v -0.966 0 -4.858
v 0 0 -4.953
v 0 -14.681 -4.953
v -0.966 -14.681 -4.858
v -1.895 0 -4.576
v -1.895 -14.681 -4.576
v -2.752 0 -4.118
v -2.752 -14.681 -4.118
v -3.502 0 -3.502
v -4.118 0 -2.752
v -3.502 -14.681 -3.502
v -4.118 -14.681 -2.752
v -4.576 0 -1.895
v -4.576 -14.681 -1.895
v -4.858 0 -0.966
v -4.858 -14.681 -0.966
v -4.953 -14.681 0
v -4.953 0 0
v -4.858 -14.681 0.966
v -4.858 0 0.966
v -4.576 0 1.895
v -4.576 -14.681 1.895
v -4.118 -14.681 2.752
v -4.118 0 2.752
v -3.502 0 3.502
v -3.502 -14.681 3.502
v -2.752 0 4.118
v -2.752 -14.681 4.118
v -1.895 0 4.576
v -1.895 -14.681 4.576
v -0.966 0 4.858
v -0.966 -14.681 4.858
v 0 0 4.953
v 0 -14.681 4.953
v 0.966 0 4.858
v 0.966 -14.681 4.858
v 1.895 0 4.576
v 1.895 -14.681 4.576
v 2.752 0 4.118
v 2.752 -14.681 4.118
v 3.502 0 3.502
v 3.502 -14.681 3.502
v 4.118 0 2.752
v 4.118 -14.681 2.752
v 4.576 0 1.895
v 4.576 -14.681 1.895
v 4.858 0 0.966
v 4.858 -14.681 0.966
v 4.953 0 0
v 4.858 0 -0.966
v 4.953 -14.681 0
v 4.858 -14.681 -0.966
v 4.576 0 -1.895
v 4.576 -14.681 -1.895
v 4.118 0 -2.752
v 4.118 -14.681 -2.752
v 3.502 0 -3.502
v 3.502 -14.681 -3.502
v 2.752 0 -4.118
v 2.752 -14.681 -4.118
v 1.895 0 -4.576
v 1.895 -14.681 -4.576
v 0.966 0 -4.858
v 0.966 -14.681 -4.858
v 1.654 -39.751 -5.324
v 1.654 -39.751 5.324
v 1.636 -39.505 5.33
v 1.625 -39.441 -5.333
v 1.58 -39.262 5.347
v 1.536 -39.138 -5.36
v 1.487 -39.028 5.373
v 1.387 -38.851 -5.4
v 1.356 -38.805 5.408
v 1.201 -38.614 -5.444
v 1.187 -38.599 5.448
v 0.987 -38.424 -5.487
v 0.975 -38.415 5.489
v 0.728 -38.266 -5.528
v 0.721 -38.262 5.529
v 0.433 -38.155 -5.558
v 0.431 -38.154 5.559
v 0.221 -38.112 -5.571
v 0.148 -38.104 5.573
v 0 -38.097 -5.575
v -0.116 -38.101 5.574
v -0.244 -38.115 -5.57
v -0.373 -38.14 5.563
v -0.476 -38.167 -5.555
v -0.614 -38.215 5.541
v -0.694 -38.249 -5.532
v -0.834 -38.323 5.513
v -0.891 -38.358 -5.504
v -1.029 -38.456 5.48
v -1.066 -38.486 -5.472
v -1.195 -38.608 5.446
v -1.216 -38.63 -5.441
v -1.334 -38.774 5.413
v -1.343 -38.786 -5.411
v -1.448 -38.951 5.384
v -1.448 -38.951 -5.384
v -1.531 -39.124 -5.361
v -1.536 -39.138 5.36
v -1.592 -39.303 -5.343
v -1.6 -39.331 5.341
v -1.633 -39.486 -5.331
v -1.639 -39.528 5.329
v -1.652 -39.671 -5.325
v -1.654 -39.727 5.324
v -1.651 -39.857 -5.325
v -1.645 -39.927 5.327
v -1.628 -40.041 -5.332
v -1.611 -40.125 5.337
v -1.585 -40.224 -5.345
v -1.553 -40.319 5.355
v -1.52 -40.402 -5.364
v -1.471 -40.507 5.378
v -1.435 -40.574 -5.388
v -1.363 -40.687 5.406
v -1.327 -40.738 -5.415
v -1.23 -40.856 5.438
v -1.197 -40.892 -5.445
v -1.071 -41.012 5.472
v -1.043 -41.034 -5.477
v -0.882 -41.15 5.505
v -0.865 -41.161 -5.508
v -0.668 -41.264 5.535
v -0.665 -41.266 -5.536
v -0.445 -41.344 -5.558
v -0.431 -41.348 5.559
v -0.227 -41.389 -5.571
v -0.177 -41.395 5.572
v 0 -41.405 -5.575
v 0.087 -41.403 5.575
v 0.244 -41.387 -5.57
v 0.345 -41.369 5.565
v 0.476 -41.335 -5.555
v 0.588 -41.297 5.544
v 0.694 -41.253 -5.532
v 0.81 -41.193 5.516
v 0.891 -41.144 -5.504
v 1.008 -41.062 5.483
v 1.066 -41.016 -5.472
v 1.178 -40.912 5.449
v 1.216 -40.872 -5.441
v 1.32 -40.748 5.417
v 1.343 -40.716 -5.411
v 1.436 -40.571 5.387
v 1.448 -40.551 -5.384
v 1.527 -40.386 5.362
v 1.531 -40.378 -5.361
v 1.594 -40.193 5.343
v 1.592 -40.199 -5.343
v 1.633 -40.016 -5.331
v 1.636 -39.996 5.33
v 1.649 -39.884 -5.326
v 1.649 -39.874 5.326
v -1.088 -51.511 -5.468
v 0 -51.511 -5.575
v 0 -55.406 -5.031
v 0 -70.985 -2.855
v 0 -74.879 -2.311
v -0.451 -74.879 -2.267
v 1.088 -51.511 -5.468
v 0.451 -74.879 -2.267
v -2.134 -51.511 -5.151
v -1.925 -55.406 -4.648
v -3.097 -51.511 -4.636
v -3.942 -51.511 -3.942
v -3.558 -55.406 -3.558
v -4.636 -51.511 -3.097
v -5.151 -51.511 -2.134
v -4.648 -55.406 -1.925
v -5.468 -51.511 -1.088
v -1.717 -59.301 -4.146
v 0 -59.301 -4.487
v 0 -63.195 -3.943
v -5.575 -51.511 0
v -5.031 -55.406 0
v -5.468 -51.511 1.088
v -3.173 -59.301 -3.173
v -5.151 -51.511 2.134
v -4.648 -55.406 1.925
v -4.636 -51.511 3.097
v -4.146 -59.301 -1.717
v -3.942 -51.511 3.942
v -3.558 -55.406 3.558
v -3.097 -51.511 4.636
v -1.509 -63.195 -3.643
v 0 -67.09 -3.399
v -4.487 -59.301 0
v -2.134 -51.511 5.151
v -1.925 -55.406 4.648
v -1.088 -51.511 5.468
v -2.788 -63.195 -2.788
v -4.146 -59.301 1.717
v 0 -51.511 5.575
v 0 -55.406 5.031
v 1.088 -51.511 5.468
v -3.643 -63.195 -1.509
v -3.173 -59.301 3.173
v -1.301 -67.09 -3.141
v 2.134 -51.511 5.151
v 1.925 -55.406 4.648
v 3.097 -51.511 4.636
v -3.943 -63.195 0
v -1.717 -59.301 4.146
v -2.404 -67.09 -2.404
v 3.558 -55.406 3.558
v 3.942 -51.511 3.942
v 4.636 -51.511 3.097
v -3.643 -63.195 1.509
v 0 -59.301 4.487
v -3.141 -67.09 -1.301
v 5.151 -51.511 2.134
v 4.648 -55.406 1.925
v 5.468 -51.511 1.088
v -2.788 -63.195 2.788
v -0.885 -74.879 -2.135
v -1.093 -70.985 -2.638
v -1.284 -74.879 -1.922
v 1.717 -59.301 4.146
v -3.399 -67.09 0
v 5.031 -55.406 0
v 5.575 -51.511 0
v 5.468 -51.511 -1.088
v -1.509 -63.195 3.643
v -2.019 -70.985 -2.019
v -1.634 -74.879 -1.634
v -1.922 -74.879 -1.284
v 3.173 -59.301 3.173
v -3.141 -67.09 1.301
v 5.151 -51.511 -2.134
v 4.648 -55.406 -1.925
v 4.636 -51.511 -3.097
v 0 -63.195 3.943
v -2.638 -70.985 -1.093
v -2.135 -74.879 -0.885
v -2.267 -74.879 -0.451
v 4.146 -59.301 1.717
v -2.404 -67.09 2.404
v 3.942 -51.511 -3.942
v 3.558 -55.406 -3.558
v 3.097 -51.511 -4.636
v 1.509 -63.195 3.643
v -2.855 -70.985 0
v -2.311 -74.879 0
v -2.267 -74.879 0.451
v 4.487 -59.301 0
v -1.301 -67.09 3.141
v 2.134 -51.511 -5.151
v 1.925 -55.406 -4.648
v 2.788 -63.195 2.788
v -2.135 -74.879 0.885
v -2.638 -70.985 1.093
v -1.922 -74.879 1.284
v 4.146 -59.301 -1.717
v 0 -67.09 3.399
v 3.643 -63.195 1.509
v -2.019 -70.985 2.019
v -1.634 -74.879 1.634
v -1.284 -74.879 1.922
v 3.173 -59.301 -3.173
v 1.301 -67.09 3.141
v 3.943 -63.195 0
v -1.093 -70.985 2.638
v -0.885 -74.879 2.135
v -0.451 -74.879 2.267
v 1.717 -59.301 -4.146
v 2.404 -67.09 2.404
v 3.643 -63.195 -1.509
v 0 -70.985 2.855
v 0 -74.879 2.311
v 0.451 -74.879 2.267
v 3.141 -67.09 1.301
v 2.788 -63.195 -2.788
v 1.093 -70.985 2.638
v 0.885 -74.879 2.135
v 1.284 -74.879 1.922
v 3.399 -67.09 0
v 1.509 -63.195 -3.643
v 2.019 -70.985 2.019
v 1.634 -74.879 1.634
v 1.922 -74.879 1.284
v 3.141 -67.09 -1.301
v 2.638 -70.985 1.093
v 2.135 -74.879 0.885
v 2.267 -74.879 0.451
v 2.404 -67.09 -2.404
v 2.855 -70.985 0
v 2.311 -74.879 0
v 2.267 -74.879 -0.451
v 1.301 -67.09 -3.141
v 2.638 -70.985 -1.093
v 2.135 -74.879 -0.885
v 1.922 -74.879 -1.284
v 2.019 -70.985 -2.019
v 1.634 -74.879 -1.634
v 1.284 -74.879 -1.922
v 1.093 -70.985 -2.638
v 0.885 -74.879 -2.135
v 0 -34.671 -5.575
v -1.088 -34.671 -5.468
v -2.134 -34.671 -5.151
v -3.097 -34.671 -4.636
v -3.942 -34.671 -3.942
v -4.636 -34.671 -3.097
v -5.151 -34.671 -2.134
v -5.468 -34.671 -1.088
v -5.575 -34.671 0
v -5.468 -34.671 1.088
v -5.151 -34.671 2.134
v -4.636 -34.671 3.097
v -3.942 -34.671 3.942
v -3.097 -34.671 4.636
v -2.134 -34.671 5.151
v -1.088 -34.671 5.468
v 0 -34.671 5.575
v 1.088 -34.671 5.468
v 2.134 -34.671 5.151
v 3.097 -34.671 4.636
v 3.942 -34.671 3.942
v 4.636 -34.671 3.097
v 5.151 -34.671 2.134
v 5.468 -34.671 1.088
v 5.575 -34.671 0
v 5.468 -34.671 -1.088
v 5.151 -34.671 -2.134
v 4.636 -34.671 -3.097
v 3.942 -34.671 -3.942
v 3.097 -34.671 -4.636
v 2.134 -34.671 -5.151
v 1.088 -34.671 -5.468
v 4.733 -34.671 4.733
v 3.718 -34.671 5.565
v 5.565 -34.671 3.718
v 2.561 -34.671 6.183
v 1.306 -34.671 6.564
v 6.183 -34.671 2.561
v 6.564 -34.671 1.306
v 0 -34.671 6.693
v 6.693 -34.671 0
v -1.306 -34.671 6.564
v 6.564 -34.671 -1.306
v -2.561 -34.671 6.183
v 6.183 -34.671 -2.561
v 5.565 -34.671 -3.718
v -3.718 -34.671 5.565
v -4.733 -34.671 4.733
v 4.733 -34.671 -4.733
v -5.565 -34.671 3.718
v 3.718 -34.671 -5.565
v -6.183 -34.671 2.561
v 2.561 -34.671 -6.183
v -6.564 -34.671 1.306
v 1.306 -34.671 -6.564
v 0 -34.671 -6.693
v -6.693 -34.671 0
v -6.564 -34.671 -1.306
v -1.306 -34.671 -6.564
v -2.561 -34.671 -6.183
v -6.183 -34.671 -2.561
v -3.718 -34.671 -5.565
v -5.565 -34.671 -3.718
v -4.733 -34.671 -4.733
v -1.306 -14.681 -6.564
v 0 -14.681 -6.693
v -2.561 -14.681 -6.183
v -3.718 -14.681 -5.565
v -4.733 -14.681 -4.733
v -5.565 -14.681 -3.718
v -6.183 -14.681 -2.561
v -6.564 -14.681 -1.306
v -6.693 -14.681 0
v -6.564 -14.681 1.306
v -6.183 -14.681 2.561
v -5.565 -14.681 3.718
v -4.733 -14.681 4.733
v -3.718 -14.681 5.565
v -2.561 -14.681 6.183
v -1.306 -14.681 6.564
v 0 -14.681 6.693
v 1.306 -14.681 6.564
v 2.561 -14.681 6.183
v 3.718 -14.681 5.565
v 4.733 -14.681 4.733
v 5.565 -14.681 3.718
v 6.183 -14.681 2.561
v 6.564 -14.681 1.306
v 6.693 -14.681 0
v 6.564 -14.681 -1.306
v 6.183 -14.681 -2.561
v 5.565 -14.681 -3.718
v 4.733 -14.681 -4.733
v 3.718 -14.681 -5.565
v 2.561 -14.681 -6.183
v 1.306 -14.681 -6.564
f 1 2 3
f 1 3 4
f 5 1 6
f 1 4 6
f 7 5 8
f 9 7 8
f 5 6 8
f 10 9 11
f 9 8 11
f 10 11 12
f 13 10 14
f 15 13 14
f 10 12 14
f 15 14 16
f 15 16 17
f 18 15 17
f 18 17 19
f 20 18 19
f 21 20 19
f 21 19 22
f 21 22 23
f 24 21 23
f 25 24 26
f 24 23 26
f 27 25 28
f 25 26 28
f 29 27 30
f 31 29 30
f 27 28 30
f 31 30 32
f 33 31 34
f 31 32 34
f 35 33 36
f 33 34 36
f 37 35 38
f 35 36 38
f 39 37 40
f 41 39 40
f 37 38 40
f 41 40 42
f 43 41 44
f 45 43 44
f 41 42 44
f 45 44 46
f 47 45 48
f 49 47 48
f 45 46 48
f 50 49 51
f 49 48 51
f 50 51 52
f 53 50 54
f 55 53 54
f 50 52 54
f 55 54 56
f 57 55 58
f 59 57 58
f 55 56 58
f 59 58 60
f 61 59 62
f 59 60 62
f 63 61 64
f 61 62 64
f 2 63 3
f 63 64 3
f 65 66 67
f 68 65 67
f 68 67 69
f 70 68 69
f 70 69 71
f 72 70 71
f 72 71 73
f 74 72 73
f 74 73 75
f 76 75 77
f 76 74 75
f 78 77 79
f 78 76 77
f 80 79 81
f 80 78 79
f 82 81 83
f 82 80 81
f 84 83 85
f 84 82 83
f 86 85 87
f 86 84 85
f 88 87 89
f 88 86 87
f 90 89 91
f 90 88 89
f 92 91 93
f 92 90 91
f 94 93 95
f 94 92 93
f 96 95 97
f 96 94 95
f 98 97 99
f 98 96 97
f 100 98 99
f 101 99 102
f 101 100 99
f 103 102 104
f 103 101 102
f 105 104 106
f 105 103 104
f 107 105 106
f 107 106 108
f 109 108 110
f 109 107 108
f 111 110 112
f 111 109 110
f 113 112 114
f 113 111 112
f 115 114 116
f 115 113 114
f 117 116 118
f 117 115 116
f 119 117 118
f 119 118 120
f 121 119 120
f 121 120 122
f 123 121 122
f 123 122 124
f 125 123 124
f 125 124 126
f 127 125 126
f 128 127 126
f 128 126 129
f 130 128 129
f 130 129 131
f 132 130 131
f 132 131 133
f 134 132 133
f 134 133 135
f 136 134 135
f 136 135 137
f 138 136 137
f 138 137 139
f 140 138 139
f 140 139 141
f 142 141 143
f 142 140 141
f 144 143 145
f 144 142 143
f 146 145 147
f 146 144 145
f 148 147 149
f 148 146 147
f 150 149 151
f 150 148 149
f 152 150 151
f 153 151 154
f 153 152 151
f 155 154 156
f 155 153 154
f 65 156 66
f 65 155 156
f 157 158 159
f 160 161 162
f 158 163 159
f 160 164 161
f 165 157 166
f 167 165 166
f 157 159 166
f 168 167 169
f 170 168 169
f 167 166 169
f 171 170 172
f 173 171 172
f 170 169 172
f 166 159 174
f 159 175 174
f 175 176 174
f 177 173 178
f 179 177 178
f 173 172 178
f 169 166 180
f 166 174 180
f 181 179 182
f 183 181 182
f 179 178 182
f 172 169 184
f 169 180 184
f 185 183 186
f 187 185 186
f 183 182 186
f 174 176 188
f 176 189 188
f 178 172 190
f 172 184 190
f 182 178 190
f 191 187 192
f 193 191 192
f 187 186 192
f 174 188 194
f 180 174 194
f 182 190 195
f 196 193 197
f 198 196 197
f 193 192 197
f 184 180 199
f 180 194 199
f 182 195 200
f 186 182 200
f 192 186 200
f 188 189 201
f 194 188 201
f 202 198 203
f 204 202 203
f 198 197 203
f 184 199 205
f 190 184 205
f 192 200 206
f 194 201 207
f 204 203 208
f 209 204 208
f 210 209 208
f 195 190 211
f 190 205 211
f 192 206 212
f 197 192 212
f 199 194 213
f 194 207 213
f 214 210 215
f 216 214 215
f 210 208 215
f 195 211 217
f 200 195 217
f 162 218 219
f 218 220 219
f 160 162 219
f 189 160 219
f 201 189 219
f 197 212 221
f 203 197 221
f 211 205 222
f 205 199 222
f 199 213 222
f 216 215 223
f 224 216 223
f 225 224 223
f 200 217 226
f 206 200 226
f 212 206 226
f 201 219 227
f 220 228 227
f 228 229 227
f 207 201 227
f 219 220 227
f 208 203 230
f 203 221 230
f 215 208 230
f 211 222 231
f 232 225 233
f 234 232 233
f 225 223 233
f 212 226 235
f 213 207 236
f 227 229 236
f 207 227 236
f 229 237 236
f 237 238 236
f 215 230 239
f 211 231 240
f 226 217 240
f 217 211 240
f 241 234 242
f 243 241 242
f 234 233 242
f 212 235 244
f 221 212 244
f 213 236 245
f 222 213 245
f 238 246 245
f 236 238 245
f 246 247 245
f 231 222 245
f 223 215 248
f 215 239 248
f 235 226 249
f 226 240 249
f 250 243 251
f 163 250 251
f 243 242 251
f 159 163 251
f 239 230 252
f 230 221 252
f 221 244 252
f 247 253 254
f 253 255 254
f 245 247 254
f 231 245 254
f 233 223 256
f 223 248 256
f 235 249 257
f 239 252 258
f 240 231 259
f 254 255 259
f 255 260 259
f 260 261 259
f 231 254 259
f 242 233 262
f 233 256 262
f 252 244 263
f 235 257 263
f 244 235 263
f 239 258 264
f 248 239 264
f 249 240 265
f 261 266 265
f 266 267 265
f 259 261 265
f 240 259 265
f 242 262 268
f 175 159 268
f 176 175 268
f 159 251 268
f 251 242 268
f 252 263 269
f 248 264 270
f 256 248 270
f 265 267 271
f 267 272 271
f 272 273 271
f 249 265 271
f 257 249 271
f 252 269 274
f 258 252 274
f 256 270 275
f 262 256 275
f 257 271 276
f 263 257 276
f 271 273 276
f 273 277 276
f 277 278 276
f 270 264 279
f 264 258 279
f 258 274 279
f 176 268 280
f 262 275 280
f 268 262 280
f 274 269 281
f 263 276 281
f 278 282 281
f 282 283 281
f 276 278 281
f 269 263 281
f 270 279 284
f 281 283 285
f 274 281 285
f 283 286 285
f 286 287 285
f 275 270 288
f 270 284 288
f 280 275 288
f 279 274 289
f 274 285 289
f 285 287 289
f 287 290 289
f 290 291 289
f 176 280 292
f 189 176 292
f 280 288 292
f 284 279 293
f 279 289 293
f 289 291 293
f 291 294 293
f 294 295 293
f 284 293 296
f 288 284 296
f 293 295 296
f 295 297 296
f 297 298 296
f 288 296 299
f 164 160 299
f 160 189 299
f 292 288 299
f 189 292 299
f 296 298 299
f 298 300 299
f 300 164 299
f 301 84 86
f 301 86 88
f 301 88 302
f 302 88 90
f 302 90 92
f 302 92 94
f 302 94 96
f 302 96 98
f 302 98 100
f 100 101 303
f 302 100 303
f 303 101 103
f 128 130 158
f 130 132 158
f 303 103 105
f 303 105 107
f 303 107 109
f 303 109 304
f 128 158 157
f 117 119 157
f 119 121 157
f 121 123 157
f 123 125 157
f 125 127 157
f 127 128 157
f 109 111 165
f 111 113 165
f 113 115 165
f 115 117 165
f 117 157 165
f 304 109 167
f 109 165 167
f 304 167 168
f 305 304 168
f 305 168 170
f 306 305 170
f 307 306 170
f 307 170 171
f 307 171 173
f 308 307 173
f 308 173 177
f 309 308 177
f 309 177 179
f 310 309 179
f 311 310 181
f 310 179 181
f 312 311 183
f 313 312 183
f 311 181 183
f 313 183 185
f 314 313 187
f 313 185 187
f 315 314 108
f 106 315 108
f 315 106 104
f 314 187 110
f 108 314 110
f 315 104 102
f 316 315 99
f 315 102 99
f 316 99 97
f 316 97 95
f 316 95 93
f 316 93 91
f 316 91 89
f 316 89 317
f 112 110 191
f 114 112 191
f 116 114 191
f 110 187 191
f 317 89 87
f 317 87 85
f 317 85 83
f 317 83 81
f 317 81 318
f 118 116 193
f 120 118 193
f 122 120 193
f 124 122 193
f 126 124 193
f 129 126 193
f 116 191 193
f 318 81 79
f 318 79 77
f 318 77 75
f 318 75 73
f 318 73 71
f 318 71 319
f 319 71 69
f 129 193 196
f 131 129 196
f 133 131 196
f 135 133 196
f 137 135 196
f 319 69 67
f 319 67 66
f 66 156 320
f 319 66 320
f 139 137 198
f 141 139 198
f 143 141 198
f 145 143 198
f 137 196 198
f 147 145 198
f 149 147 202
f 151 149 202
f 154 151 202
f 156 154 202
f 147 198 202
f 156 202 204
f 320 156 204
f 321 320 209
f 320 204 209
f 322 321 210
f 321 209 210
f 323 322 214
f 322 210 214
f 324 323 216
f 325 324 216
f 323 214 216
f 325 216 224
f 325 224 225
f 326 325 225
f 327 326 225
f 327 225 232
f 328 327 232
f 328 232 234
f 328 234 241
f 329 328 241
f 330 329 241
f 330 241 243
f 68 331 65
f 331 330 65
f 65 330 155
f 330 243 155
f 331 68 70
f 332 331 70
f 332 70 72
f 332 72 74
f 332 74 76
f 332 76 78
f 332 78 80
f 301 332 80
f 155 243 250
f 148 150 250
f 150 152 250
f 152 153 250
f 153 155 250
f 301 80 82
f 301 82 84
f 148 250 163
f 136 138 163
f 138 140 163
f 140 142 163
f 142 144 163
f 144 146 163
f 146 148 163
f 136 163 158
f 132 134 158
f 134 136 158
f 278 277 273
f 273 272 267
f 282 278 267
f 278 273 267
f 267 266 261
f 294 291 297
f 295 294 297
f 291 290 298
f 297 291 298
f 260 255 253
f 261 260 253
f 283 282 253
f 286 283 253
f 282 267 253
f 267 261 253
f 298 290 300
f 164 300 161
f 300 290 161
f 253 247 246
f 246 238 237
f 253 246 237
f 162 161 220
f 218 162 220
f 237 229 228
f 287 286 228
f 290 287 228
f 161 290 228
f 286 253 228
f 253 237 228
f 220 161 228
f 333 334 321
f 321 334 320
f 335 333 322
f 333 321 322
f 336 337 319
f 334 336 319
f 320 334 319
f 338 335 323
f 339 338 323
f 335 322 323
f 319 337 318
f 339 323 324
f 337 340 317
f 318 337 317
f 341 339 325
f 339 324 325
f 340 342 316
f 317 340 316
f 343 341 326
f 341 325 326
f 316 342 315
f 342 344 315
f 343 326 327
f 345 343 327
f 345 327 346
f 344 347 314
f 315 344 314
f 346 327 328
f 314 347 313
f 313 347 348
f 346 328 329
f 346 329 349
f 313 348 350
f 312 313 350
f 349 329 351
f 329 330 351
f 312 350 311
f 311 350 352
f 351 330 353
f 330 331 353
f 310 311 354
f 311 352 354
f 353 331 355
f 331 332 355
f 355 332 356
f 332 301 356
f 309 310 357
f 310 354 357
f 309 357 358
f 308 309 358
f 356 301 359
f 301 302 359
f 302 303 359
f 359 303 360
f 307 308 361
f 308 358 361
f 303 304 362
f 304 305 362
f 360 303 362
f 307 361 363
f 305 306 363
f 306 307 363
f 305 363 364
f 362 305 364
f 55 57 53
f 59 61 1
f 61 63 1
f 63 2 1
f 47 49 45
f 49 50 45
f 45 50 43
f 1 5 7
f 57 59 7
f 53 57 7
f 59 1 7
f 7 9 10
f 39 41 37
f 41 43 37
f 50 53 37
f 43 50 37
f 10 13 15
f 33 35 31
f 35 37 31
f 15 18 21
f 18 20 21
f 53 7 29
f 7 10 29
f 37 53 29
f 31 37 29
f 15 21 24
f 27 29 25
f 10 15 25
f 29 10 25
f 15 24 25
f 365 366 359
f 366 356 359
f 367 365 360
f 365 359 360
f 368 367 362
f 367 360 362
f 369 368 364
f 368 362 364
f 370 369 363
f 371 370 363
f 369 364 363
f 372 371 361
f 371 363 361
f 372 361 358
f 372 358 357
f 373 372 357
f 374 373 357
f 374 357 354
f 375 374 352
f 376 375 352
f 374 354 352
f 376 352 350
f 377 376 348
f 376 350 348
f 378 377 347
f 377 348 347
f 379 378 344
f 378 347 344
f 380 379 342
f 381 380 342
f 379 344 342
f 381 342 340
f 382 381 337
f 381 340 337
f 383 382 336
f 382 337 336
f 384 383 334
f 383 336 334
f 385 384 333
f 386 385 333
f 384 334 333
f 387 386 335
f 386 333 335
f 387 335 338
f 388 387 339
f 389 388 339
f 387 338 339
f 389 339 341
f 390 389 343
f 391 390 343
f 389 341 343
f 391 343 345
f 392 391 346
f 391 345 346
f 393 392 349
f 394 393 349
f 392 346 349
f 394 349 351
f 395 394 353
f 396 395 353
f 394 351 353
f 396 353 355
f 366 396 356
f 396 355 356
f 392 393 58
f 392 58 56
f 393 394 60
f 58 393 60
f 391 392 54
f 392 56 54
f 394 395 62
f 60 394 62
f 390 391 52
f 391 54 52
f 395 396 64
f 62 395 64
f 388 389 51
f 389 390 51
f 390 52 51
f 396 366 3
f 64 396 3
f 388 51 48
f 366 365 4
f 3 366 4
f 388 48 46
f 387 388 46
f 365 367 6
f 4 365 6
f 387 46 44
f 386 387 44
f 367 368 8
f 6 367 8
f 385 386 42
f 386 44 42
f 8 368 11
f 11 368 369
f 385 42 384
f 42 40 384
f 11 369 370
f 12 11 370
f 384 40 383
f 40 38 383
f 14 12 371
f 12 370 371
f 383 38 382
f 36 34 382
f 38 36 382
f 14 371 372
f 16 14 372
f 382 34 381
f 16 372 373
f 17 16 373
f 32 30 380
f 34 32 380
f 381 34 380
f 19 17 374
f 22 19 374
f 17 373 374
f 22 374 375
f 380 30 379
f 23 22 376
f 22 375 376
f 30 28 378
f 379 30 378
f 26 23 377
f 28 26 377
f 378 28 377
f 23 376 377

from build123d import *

# Parameters (mm, degrees)
CUT_EXTRUDE1_DEPTH      = 76.475058221
CUT_EXTRUDE1_DEPTH_BACK = 76.475058221
SKETCH2_R               = 1.653940434


with BuildPart() as part:
    # Sketch1 → Revolve1 (revolve)
    with BuildSketch(Plane.XY, mode=Mode.PRIVATE) as revolve1_sk:
        Polygon((0, 0), (4.953, 0), (4.953, -14.6812), (6.6929, -14.6812), (6.6929, -34.671), (5.5753, -34.671), (5.5753, -51.5112), (2.3114, -74.8792), (0, -74.8792), align=None)
    revolve(revolve1_sk.sketch.rotate(Axis((0, -74.8792, 0), (0, 1, 0)), 90), axis=Axis((0, -74.8792, 0), (0, 1, 0)))

    # Sketch2 → Cut-Extrude1 (cut, two sides: drawn at the far end of the back side and taken through both)
    with BuildSketch(Plane.XY.offset(-CUT_EXTRUDE1_DEPTH_BACK)):
        with Locations((0, -39.751)):
            Circle(SKETCH2_R)
    extrude(amount=CUT_EXTRUDE1_DEPTH + CUT_EXTRUDE1_DEPTH_BACK, mode=Mode.SUBTRACT)


solid = part.part
